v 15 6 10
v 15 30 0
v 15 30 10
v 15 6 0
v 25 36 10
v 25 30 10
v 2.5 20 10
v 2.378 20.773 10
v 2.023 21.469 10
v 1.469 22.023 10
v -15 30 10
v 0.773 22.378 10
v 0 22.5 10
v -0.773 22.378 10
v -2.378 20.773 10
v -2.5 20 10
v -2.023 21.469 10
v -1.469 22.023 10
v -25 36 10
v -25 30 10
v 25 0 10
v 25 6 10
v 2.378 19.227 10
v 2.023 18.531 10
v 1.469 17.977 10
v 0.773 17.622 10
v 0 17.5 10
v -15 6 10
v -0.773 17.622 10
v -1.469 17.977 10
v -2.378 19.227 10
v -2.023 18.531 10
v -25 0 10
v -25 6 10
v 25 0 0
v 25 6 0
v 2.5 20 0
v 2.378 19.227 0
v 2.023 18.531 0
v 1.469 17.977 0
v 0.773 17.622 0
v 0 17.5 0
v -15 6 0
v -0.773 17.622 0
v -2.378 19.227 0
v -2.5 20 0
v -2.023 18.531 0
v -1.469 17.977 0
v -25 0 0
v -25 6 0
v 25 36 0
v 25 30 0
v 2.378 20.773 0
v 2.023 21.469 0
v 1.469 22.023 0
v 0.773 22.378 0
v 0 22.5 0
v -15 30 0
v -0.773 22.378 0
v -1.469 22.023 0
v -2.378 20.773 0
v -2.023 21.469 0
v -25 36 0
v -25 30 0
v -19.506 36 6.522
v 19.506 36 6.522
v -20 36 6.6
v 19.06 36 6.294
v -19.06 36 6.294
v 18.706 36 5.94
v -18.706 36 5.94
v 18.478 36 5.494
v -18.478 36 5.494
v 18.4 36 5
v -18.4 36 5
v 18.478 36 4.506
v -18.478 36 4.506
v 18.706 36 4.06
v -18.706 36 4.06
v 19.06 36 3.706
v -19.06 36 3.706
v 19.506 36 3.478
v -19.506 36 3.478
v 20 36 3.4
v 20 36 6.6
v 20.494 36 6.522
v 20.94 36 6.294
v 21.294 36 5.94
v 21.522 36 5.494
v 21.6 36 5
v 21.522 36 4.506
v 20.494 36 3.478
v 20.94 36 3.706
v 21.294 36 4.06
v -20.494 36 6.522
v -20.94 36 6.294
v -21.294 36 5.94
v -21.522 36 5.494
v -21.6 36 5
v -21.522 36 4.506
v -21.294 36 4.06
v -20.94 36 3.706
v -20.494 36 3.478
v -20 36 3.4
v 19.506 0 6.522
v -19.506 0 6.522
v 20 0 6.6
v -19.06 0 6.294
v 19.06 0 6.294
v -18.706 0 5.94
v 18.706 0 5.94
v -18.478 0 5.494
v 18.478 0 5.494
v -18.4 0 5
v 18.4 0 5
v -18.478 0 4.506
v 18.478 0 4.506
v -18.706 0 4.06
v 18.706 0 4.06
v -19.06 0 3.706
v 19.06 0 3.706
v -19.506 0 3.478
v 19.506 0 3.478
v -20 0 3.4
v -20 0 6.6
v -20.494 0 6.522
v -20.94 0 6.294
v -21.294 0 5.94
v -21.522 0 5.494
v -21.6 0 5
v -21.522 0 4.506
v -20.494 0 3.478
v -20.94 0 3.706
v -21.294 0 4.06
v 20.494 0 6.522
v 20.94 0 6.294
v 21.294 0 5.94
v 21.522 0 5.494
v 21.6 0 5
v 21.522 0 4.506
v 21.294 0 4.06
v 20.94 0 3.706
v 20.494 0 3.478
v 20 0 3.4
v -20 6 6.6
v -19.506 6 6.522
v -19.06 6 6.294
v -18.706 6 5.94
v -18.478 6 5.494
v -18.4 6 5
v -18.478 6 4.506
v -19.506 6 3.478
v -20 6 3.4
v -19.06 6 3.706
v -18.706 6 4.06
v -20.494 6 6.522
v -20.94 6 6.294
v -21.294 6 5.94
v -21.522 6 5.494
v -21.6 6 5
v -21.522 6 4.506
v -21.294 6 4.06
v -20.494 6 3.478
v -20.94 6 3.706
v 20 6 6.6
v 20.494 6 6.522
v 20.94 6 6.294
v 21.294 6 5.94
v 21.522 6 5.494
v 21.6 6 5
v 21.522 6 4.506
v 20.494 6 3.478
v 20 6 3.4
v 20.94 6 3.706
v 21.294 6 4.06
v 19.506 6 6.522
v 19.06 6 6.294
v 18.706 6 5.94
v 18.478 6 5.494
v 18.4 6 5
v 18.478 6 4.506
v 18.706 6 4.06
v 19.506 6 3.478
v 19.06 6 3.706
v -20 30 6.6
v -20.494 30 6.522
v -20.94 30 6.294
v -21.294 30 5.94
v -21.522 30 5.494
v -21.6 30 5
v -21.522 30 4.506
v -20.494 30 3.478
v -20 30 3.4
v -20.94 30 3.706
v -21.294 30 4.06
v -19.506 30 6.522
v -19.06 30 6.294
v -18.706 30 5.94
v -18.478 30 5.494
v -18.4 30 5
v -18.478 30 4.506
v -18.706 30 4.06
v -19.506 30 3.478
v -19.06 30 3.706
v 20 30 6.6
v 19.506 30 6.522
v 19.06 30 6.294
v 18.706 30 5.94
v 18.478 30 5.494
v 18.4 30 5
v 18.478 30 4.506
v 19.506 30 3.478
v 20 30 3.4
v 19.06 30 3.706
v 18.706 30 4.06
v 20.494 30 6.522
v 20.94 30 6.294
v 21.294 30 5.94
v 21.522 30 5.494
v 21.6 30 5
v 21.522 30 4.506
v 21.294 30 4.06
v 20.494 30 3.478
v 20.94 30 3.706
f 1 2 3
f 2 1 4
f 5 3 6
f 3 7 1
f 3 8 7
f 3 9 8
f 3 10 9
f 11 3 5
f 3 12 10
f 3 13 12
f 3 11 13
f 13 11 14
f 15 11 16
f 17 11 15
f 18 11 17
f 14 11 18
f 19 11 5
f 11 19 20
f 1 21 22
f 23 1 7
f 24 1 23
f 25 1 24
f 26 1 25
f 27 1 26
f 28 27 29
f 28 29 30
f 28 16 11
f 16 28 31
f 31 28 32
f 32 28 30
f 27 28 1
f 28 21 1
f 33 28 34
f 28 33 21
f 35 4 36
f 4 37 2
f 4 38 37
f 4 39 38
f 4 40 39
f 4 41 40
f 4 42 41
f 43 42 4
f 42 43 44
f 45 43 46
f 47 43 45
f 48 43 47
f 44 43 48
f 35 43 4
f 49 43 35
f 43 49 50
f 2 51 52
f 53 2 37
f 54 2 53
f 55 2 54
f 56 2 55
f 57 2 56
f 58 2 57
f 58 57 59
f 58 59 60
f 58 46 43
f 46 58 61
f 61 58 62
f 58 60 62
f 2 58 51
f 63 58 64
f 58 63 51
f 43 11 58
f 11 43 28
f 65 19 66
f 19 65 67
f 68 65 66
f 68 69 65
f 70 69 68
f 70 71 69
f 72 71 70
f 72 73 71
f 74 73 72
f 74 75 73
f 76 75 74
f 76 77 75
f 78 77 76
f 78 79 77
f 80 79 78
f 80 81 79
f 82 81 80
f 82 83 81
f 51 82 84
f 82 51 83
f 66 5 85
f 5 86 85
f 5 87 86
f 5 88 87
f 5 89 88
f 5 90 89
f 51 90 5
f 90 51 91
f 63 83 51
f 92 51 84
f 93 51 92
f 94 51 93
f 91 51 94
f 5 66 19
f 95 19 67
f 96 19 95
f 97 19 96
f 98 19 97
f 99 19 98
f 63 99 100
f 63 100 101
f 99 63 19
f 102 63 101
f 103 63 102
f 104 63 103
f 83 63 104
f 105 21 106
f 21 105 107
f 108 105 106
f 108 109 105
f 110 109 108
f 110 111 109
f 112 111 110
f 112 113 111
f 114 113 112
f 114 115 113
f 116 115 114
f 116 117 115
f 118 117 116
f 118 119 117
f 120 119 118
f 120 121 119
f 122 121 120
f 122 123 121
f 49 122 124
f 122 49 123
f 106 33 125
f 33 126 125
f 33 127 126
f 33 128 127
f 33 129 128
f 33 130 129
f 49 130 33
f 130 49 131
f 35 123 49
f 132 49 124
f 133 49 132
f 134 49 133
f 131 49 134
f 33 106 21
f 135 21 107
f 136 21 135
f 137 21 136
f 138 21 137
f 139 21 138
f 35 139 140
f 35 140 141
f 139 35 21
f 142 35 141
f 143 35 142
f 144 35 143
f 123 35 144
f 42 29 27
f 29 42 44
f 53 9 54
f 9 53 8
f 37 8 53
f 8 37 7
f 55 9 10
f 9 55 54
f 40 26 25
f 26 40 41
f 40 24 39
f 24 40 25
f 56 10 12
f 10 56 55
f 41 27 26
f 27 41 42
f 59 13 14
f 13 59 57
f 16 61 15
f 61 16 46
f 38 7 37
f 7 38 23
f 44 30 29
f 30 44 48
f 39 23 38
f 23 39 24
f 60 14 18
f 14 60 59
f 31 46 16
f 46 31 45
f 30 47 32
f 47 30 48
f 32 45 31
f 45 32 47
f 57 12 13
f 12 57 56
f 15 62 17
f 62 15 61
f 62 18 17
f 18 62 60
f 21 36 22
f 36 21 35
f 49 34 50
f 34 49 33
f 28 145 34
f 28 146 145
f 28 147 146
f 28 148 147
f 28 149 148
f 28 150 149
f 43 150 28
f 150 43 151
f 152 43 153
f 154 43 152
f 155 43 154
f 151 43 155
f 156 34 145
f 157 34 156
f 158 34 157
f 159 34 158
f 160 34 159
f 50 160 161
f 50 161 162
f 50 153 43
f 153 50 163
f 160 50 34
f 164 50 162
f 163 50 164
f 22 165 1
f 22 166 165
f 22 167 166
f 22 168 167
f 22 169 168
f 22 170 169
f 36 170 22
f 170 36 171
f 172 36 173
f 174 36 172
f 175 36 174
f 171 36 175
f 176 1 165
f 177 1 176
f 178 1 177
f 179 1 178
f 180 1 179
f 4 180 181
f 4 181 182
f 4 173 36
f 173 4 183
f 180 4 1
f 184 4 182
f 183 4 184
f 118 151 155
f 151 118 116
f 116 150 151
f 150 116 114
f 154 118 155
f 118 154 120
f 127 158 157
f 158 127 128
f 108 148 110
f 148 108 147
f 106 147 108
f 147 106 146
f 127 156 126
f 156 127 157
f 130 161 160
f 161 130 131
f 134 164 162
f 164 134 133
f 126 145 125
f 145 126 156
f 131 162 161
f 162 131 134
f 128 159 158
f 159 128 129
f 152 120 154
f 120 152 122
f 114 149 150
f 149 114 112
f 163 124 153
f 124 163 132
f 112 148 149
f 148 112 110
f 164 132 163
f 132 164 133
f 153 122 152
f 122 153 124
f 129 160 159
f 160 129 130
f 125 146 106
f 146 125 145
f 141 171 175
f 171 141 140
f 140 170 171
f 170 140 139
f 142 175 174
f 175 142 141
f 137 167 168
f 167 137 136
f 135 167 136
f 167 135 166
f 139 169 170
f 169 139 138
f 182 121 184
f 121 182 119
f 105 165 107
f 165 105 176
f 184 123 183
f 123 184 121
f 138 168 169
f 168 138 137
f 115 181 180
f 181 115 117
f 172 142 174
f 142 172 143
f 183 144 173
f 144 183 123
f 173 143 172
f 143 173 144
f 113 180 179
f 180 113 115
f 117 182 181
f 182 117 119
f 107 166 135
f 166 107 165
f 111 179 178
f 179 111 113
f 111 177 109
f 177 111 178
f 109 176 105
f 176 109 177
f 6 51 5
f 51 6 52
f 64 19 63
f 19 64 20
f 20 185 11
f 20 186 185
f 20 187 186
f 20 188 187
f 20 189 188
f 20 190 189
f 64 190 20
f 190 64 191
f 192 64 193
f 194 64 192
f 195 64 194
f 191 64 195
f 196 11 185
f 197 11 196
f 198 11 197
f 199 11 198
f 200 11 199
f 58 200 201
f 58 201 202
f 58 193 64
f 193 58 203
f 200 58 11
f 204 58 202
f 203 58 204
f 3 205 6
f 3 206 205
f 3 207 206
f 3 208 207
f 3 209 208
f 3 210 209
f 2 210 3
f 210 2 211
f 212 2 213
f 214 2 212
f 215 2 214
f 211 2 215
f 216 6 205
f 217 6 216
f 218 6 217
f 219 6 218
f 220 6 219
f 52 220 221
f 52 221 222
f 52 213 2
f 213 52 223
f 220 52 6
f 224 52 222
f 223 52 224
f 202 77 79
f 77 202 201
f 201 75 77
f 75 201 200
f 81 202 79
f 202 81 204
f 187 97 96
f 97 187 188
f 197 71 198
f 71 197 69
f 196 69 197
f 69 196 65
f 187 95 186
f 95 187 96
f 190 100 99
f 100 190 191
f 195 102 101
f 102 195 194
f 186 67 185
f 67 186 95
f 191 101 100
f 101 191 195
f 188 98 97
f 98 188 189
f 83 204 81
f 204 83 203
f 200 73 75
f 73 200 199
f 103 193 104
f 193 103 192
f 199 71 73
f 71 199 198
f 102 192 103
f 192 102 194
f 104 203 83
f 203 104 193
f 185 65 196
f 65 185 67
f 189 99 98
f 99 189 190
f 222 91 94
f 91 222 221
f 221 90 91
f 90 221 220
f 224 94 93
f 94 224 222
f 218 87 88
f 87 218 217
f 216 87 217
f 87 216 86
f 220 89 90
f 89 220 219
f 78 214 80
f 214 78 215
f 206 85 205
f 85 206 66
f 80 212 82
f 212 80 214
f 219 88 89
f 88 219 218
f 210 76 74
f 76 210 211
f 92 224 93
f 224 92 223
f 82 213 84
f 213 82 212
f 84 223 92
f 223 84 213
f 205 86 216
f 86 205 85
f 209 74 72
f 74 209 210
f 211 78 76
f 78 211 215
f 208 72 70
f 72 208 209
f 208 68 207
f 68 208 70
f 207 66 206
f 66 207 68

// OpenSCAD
difference(){
translate([-15,0,0])cube([30,36,10]);
translate([0,20,0])cylinder(d=5,h=10,$fn=20);
}

difference(){
translate([-25,0,0])cube([50,6,10]);
translate([-20,0,5])rotate([-90,0,0])
    cylinder(d=3.2,h=10,$fn=20);
translate([20,0,5])rotate([-90,0,0])
    cylinder(d=3.2,h=10,$fn=20);
}

translate([0,30,0])
difference(){
translate([-25,0,0])cube([50,6,10]);
translate([-20,0,5])rotate([-90,0,0])
    cylinder(d=3.2,h=10,$fn=20);
translate([20,0,5])rotate([-90,0,0])
    cylinder(d=3.2,h=10,$fn=20);
}
